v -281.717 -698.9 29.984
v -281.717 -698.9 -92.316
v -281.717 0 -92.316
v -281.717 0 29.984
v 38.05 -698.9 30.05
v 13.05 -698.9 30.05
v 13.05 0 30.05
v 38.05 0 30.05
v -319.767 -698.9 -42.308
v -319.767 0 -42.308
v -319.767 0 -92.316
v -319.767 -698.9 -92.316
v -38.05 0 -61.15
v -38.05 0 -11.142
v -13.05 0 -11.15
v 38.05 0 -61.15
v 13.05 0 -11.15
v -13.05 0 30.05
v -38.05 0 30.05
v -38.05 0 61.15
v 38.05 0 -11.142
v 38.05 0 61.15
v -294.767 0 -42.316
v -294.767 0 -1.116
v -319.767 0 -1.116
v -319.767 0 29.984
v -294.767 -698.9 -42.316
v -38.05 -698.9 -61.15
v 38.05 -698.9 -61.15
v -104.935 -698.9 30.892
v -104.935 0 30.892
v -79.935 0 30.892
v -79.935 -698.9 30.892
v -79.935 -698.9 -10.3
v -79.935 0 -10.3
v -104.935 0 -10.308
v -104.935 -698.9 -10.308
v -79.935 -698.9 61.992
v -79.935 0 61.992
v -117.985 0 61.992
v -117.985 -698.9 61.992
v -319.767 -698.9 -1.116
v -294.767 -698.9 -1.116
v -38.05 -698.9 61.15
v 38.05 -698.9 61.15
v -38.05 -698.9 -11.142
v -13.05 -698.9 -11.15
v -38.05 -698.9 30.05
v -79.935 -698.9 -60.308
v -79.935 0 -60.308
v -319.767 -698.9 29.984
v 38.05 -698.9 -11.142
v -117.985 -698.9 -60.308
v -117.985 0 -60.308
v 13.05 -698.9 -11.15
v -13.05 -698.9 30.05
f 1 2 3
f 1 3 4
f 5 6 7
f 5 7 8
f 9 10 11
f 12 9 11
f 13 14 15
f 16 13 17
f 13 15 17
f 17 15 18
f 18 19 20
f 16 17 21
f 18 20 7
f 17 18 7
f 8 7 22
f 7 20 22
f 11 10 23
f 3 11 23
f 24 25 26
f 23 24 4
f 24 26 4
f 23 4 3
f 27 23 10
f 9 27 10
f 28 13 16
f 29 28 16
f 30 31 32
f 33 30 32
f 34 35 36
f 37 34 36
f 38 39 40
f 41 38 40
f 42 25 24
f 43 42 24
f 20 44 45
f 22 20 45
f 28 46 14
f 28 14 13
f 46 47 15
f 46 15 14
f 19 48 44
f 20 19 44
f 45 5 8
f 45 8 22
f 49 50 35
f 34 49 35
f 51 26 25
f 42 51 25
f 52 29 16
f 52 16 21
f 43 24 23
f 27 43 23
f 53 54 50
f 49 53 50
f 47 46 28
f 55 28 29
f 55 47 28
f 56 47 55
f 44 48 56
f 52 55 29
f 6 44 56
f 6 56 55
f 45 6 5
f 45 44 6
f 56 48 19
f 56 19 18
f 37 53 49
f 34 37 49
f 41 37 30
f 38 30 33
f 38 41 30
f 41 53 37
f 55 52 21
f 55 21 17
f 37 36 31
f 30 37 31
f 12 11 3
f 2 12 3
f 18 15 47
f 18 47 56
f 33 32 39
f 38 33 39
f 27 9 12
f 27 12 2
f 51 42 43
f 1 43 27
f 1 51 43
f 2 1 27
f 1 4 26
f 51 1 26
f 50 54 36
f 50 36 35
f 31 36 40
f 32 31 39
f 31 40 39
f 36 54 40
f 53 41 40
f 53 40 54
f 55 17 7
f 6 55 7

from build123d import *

# Parameters (mm, degrees)
F0_W     = 26.1
F0_H     = 122.3
F1_DEPTH = 698.9
F2_W     = 25
F2_H     = 31.1
F3_DEPTH = 698.9
F5_DEPTH = 698.9
F7_DEPTH = 698.9


with BuildPart() as f1:
    # F0 (on Front) → F1 (new body)
    with BuildSketch(Plane.XZ):
        Rectangle(F0_W, F0_H)
    extrude(amount=F1_DEPTH)

    # F2 (on face) → F3 (join)
    with BuildSketch(Plane.XZ.offset(698.9)):
        with Locations((-25.55, 45.6)):
            Rectangle(F2_W, F2_H)
        Polygon((-38.05, -61.15), (-13.05, -61.15), (-13.05, -11.15), (-38.05, -11.142086), align=None)
        with Locations((25.55, 45.6)):
            Rectangle(F2_W, F2_H)
        Polygon((38.05, -61.15), (38.05, -11.142086), (13.05, -11.15), (13.05, -61.15), align=None)
    extrude(amount=-F3_DEPTH)


with BuildPart() as f5:
    # F4 (on Front) → F5 (new body)
    with BuildSketch(Plane.XZ):
        Polygon((-104.935138, 30.892459), (-79.935138, 30.892459), (-79.935138, 61.992459), (-117.985138, 61.992459), (-117.985138, -60.307541), (-79.935138, -60.307541), (-79.935138, -10.299627), (-104.935138, -10.307541), align=None)
    extrude(amount=F5_DEPTH)


with BuildPart() as f7:
    # F6 (on Front) → F7 (new body)
    with BuildSketch(Plane.XZ):
        Polygon((-281.716662, -92.315719), (-281.716662, 29.984281), (-319.766662, 29.984281), (-319.766662, -1.115719), (-294.766662, -1.115719), (-294.766662, -42.315719), (-319.766662, -42.307805), (-319.766662, -92.315719), align=None)
    extrude(amount=F7_DEPTH)


solid = Compound([f1.part, f5.part, f7.part])
